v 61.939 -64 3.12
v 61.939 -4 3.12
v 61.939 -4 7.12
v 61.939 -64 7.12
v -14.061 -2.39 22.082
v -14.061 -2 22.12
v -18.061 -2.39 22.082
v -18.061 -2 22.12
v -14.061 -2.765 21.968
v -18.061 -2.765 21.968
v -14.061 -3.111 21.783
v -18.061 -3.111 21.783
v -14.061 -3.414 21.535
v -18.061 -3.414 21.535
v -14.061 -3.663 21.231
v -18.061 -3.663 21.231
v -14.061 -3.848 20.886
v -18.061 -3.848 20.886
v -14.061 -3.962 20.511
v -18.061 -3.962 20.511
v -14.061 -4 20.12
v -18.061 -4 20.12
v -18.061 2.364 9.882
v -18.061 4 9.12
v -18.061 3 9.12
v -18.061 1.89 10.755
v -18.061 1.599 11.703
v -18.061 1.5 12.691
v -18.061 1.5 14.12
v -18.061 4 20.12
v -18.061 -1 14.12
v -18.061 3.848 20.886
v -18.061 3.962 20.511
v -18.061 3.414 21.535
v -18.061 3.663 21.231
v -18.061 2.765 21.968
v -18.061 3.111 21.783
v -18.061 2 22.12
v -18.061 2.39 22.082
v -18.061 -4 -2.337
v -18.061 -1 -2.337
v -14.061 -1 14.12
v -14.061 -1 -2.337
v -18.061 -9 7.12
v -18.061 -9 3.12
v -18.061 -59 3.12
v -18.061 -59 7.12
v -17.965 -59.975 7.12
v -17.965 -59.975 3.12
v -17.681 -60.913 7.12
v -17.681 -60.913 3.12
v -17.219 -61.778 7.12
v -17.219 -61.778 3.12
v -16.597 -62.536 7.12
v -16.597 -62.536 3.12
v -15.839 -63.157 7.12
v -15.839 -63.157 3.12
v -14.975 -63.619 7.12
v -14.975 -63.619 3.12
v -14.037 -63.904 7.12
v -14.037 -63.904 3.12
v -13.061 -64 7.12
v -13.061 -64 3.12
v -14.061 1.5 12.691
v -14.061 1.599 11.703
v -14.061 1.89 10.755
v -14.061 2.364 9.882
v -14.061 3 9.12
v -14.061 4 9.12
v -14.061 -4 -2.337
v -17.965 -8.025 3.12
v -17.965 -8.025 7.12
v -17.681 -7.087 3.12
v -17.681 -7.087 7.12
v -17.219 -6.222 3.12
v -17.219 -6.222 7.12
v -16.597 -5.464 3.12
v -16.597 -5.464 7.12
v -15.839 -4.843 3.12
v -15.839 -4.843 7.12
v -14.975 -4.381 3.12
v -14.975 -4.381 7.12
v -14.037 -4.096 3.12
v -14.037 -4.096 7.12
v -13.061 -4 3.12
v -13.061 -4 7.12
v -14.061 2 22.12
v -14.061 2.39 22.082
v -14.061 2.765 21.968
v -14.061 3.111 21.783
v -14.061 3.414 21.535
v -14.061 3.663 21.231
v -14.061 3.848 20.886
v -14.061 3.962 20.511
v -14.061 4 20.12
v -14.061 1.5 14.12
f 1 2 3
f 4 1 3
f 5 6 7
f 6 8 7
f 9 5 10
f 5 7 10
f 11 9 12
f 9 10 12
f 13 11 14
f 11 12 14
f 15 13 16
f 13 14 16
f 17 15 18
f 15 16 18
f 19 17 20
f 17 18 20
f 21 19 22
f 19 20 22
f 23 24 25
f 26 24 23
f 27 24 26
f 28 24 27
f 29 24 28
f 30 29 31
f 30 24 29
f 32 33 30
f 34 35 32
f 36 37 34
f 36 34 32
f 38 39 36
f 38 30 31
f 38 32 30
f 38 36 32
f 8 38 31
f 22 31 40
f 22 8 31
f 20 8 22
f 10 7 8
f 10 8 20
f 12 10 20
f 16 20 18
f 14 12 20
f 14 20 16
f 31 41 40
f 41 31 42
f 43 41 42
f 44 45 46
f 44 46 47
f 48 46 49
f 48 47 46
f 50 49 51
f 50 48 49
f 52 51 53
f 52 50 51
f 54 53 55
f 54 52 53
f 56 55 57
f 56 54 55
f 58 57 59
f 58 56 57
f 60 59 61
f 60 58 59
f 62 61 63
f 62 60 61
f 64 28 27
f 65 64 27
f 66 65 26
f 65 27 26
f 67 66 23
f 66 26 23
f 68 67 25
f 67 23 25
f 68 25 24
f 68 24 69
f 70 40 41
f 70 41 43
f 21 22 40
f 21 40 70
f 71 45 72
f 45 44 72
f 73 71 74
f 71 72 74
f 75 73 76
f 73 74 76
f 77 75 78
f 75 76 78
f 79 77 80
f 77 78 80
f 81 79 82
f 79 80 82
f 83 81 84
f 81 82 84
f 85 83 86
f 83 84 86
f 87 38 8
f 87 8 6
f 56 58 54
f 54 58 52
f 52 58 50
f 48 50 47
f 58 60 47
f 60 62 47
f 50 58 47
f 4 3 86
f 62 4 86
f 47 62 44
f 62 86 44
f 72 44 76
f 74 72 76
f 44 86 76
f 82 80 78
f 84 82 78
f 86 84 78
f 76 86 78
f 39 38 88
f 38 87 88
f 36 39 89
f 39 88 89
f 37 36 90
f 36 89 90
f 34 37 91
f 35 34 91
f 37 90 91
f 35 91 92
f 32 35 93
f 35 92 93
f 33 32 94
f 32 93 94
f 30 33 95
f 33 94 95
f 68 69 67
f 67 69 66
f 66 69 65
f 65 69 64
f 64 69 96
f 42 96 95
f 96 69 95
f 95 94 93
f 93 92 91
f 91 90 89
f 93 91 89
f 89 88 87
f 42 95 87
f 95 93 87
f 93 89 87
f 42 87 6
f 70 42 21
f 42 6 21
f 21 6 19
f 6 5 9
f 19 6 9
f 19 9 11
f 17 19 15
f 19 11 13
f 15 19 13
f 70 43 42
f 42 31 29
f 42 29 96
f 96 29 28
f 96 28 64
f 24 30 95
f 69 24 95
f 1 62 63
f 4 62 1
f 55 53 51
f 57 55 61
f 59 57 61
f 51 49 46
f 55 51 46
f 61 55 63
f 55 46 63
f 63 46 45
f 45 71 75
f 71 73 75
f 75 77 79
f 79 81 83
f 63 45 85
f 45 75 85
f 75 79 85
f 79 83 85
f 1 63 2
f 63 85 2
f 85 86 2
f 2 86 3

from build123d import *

# Parameters (mm, degrees)
F2_W        = 4
F2_H        = 11
F3_DEPTH    = 4
F4_W        = 4
F4_H        = 3
F5_DEPTH    = 25
F6_W        = 4
F6_H        = 2.5
F7_DEPTH    = 5
F8_SIZE2    = 1
F8_SIZE     = 1.5
F9_T1_DEPTH = 16.8535710714
F10_R       = 5
F11_W       = 4
F11_H       = 4
F11_W_2     = 76
F12_DEPTH   = 60
F14_W       = 12.6825077459
F14_H       = 13.7545838952
F15_DEPTH   = 25
F16_R       = 2
F17_R       = 5
F19_W       = 20.4623111058
F19_H       = 23.2868297026
F20_DEPTH   = 25
F21_R       = 1.99999


# Not quite as in the source:
# - a fillet or chamfer that OpenCascade refuses, or shapes differently, is made with other operations: its cross-section is extruded or revolved along the edge and cut away or added
# - a fillet or chamfer is up to 0.001 mm smaller than in the source, because OpenCascade refuses the exact size


with BuildPart() as f3:
    # F2 (on Front) → F3 (new body, symmetric)
    with BuildSketch(Plane.XZ):
        with Locations((-16.0614851415, 19.6203391254)):
            Rectangle(F2_W, F2_H)
    extrude(amount=F3_DEPTH, both=True)

    # F4 (on face) → F5 (join)
    with BuildSketch(Plane(origin=(0, 0, 14.1203391254), x_dir=(1, 0, 0), z_dir=(0, 0, -1))):
        with Locations((-16.0614851415, 2.5)):
            Rectangle(F4_W, F4_H)
    extrude(amount=F5_DEPTH)

    # F6 (on face) → F7 (join)
    with BuildSketch(Plane(origin=(0, 0, 14.1203391254), x_dir=(1, 0, 0), z_dir=(0, 0, -1))):
        with Locations((-16.0614851415, -2.75)):
            Rectangle(F6_W, F6_H)
    extrude(amount=F7_DEPTH)

    # F8
    f8_edges = [f3.edges().sort_by_distance(p)[0] for p in [
        (-16.061485, 1.5, 9.120339),
    ]]
    f8_side = f3.faces().sort_by_distance((-16.061485, 2.75, 9.120339))[0]
    chamfer(f8_edges, length=F8_SIZE, length2=F8_SIZE2, reference=f8_side)

    # F9: fillet of radius 5 on 1 edges, made by hand

    # F9_s2 → F9_t1 (cut)
    with BuildSketch(Plane.YZ.offset(-24.4882706772)):
        with BuildLine():
            ThreePointArc((1.5, 12.6910533397), (1.8902277714, 10.7545616666), (3, 9.1203391254))
            Line((3, 9.1203391254), (1.5, 10.1203391254))
            Line((1.5, 10.1203391254), (1.5, 12.6910533397))
        make_face()
    extrude(amount=F9_T1_DEPTH, mode=Mode.SUBTRACT)

    # F10
    f10_edges = [f3.edges().sort_by_distance(p)[0] for p in [
        (-16.061485, 4, 25.120339),
    ]]
    fillet(f10_edges, radius=F10_R)

    # F14 (on offset) → F15 (cut)
    with BuildSketch(Plane(origin=(0, 0, -2.3372200429), x_dir=(1, 0, 0), z_dir=(0, 0, -1))):
        with Locations((-17.142616678, -0.0888193026)):
            Rectangle(F14_W, F14_H)
    extrude(amount=F15_DEPTH, mode=Mode.SUBTRACT)

    # F16
    f16_edges = [f3.edges().sort_by_distance(p)[0] for p in [
        (-16.061485, -4, 25.120339),
    ]]
    fillet(f16_edges, radius=F16_R)

    # F19 (on offset) → F20 (cut)
    with BuildSketch(Plane.XY.offset(22.1203391254)):
        with Locations((-13.2027346408, 1.5548248775)):
            Rectangle(F19_W, F19_H)
    extrude(amount=F20_DEPTH, mode=Mode.SUBTRACT)

    # F21 (radius 2 in the source; OpenCascade refuses exactly that, so slightly less here)
    f21_edges = [f3.edges().sort_by_distance(p)[0] for p in [
        (-16.061485, -4, 22.120339),
        (-16.061485, 3.582576, 22.120339),
    ]]
    fillet(f21_edges, radius=F21_R)


with BuildPart() as f12:
    # F11 (on face) → F12 (new body)
    with BuildSketch(Plane.XZ.offset(4)):
        with Locations((-16.0614851415, 5.1203391254)):
            Rectangle(F11_W, F11_H)
        with Locations((23.9385148585, 5.1203391254)):
            Rectangle(F11_W_2, F11_H)
    extrude(amount=F12_DEPTH)

    # F17
    f17_edges = [f12.edges().sort_by_distance(p)[0] for p in [
        (-18.061485, -4, 5.120339),
        (-18.061485, -64, 5.120339),
    ]]
    fillet(f17_edges, radius=F17_R)


solid = Compound([f3.part, f12.part])
